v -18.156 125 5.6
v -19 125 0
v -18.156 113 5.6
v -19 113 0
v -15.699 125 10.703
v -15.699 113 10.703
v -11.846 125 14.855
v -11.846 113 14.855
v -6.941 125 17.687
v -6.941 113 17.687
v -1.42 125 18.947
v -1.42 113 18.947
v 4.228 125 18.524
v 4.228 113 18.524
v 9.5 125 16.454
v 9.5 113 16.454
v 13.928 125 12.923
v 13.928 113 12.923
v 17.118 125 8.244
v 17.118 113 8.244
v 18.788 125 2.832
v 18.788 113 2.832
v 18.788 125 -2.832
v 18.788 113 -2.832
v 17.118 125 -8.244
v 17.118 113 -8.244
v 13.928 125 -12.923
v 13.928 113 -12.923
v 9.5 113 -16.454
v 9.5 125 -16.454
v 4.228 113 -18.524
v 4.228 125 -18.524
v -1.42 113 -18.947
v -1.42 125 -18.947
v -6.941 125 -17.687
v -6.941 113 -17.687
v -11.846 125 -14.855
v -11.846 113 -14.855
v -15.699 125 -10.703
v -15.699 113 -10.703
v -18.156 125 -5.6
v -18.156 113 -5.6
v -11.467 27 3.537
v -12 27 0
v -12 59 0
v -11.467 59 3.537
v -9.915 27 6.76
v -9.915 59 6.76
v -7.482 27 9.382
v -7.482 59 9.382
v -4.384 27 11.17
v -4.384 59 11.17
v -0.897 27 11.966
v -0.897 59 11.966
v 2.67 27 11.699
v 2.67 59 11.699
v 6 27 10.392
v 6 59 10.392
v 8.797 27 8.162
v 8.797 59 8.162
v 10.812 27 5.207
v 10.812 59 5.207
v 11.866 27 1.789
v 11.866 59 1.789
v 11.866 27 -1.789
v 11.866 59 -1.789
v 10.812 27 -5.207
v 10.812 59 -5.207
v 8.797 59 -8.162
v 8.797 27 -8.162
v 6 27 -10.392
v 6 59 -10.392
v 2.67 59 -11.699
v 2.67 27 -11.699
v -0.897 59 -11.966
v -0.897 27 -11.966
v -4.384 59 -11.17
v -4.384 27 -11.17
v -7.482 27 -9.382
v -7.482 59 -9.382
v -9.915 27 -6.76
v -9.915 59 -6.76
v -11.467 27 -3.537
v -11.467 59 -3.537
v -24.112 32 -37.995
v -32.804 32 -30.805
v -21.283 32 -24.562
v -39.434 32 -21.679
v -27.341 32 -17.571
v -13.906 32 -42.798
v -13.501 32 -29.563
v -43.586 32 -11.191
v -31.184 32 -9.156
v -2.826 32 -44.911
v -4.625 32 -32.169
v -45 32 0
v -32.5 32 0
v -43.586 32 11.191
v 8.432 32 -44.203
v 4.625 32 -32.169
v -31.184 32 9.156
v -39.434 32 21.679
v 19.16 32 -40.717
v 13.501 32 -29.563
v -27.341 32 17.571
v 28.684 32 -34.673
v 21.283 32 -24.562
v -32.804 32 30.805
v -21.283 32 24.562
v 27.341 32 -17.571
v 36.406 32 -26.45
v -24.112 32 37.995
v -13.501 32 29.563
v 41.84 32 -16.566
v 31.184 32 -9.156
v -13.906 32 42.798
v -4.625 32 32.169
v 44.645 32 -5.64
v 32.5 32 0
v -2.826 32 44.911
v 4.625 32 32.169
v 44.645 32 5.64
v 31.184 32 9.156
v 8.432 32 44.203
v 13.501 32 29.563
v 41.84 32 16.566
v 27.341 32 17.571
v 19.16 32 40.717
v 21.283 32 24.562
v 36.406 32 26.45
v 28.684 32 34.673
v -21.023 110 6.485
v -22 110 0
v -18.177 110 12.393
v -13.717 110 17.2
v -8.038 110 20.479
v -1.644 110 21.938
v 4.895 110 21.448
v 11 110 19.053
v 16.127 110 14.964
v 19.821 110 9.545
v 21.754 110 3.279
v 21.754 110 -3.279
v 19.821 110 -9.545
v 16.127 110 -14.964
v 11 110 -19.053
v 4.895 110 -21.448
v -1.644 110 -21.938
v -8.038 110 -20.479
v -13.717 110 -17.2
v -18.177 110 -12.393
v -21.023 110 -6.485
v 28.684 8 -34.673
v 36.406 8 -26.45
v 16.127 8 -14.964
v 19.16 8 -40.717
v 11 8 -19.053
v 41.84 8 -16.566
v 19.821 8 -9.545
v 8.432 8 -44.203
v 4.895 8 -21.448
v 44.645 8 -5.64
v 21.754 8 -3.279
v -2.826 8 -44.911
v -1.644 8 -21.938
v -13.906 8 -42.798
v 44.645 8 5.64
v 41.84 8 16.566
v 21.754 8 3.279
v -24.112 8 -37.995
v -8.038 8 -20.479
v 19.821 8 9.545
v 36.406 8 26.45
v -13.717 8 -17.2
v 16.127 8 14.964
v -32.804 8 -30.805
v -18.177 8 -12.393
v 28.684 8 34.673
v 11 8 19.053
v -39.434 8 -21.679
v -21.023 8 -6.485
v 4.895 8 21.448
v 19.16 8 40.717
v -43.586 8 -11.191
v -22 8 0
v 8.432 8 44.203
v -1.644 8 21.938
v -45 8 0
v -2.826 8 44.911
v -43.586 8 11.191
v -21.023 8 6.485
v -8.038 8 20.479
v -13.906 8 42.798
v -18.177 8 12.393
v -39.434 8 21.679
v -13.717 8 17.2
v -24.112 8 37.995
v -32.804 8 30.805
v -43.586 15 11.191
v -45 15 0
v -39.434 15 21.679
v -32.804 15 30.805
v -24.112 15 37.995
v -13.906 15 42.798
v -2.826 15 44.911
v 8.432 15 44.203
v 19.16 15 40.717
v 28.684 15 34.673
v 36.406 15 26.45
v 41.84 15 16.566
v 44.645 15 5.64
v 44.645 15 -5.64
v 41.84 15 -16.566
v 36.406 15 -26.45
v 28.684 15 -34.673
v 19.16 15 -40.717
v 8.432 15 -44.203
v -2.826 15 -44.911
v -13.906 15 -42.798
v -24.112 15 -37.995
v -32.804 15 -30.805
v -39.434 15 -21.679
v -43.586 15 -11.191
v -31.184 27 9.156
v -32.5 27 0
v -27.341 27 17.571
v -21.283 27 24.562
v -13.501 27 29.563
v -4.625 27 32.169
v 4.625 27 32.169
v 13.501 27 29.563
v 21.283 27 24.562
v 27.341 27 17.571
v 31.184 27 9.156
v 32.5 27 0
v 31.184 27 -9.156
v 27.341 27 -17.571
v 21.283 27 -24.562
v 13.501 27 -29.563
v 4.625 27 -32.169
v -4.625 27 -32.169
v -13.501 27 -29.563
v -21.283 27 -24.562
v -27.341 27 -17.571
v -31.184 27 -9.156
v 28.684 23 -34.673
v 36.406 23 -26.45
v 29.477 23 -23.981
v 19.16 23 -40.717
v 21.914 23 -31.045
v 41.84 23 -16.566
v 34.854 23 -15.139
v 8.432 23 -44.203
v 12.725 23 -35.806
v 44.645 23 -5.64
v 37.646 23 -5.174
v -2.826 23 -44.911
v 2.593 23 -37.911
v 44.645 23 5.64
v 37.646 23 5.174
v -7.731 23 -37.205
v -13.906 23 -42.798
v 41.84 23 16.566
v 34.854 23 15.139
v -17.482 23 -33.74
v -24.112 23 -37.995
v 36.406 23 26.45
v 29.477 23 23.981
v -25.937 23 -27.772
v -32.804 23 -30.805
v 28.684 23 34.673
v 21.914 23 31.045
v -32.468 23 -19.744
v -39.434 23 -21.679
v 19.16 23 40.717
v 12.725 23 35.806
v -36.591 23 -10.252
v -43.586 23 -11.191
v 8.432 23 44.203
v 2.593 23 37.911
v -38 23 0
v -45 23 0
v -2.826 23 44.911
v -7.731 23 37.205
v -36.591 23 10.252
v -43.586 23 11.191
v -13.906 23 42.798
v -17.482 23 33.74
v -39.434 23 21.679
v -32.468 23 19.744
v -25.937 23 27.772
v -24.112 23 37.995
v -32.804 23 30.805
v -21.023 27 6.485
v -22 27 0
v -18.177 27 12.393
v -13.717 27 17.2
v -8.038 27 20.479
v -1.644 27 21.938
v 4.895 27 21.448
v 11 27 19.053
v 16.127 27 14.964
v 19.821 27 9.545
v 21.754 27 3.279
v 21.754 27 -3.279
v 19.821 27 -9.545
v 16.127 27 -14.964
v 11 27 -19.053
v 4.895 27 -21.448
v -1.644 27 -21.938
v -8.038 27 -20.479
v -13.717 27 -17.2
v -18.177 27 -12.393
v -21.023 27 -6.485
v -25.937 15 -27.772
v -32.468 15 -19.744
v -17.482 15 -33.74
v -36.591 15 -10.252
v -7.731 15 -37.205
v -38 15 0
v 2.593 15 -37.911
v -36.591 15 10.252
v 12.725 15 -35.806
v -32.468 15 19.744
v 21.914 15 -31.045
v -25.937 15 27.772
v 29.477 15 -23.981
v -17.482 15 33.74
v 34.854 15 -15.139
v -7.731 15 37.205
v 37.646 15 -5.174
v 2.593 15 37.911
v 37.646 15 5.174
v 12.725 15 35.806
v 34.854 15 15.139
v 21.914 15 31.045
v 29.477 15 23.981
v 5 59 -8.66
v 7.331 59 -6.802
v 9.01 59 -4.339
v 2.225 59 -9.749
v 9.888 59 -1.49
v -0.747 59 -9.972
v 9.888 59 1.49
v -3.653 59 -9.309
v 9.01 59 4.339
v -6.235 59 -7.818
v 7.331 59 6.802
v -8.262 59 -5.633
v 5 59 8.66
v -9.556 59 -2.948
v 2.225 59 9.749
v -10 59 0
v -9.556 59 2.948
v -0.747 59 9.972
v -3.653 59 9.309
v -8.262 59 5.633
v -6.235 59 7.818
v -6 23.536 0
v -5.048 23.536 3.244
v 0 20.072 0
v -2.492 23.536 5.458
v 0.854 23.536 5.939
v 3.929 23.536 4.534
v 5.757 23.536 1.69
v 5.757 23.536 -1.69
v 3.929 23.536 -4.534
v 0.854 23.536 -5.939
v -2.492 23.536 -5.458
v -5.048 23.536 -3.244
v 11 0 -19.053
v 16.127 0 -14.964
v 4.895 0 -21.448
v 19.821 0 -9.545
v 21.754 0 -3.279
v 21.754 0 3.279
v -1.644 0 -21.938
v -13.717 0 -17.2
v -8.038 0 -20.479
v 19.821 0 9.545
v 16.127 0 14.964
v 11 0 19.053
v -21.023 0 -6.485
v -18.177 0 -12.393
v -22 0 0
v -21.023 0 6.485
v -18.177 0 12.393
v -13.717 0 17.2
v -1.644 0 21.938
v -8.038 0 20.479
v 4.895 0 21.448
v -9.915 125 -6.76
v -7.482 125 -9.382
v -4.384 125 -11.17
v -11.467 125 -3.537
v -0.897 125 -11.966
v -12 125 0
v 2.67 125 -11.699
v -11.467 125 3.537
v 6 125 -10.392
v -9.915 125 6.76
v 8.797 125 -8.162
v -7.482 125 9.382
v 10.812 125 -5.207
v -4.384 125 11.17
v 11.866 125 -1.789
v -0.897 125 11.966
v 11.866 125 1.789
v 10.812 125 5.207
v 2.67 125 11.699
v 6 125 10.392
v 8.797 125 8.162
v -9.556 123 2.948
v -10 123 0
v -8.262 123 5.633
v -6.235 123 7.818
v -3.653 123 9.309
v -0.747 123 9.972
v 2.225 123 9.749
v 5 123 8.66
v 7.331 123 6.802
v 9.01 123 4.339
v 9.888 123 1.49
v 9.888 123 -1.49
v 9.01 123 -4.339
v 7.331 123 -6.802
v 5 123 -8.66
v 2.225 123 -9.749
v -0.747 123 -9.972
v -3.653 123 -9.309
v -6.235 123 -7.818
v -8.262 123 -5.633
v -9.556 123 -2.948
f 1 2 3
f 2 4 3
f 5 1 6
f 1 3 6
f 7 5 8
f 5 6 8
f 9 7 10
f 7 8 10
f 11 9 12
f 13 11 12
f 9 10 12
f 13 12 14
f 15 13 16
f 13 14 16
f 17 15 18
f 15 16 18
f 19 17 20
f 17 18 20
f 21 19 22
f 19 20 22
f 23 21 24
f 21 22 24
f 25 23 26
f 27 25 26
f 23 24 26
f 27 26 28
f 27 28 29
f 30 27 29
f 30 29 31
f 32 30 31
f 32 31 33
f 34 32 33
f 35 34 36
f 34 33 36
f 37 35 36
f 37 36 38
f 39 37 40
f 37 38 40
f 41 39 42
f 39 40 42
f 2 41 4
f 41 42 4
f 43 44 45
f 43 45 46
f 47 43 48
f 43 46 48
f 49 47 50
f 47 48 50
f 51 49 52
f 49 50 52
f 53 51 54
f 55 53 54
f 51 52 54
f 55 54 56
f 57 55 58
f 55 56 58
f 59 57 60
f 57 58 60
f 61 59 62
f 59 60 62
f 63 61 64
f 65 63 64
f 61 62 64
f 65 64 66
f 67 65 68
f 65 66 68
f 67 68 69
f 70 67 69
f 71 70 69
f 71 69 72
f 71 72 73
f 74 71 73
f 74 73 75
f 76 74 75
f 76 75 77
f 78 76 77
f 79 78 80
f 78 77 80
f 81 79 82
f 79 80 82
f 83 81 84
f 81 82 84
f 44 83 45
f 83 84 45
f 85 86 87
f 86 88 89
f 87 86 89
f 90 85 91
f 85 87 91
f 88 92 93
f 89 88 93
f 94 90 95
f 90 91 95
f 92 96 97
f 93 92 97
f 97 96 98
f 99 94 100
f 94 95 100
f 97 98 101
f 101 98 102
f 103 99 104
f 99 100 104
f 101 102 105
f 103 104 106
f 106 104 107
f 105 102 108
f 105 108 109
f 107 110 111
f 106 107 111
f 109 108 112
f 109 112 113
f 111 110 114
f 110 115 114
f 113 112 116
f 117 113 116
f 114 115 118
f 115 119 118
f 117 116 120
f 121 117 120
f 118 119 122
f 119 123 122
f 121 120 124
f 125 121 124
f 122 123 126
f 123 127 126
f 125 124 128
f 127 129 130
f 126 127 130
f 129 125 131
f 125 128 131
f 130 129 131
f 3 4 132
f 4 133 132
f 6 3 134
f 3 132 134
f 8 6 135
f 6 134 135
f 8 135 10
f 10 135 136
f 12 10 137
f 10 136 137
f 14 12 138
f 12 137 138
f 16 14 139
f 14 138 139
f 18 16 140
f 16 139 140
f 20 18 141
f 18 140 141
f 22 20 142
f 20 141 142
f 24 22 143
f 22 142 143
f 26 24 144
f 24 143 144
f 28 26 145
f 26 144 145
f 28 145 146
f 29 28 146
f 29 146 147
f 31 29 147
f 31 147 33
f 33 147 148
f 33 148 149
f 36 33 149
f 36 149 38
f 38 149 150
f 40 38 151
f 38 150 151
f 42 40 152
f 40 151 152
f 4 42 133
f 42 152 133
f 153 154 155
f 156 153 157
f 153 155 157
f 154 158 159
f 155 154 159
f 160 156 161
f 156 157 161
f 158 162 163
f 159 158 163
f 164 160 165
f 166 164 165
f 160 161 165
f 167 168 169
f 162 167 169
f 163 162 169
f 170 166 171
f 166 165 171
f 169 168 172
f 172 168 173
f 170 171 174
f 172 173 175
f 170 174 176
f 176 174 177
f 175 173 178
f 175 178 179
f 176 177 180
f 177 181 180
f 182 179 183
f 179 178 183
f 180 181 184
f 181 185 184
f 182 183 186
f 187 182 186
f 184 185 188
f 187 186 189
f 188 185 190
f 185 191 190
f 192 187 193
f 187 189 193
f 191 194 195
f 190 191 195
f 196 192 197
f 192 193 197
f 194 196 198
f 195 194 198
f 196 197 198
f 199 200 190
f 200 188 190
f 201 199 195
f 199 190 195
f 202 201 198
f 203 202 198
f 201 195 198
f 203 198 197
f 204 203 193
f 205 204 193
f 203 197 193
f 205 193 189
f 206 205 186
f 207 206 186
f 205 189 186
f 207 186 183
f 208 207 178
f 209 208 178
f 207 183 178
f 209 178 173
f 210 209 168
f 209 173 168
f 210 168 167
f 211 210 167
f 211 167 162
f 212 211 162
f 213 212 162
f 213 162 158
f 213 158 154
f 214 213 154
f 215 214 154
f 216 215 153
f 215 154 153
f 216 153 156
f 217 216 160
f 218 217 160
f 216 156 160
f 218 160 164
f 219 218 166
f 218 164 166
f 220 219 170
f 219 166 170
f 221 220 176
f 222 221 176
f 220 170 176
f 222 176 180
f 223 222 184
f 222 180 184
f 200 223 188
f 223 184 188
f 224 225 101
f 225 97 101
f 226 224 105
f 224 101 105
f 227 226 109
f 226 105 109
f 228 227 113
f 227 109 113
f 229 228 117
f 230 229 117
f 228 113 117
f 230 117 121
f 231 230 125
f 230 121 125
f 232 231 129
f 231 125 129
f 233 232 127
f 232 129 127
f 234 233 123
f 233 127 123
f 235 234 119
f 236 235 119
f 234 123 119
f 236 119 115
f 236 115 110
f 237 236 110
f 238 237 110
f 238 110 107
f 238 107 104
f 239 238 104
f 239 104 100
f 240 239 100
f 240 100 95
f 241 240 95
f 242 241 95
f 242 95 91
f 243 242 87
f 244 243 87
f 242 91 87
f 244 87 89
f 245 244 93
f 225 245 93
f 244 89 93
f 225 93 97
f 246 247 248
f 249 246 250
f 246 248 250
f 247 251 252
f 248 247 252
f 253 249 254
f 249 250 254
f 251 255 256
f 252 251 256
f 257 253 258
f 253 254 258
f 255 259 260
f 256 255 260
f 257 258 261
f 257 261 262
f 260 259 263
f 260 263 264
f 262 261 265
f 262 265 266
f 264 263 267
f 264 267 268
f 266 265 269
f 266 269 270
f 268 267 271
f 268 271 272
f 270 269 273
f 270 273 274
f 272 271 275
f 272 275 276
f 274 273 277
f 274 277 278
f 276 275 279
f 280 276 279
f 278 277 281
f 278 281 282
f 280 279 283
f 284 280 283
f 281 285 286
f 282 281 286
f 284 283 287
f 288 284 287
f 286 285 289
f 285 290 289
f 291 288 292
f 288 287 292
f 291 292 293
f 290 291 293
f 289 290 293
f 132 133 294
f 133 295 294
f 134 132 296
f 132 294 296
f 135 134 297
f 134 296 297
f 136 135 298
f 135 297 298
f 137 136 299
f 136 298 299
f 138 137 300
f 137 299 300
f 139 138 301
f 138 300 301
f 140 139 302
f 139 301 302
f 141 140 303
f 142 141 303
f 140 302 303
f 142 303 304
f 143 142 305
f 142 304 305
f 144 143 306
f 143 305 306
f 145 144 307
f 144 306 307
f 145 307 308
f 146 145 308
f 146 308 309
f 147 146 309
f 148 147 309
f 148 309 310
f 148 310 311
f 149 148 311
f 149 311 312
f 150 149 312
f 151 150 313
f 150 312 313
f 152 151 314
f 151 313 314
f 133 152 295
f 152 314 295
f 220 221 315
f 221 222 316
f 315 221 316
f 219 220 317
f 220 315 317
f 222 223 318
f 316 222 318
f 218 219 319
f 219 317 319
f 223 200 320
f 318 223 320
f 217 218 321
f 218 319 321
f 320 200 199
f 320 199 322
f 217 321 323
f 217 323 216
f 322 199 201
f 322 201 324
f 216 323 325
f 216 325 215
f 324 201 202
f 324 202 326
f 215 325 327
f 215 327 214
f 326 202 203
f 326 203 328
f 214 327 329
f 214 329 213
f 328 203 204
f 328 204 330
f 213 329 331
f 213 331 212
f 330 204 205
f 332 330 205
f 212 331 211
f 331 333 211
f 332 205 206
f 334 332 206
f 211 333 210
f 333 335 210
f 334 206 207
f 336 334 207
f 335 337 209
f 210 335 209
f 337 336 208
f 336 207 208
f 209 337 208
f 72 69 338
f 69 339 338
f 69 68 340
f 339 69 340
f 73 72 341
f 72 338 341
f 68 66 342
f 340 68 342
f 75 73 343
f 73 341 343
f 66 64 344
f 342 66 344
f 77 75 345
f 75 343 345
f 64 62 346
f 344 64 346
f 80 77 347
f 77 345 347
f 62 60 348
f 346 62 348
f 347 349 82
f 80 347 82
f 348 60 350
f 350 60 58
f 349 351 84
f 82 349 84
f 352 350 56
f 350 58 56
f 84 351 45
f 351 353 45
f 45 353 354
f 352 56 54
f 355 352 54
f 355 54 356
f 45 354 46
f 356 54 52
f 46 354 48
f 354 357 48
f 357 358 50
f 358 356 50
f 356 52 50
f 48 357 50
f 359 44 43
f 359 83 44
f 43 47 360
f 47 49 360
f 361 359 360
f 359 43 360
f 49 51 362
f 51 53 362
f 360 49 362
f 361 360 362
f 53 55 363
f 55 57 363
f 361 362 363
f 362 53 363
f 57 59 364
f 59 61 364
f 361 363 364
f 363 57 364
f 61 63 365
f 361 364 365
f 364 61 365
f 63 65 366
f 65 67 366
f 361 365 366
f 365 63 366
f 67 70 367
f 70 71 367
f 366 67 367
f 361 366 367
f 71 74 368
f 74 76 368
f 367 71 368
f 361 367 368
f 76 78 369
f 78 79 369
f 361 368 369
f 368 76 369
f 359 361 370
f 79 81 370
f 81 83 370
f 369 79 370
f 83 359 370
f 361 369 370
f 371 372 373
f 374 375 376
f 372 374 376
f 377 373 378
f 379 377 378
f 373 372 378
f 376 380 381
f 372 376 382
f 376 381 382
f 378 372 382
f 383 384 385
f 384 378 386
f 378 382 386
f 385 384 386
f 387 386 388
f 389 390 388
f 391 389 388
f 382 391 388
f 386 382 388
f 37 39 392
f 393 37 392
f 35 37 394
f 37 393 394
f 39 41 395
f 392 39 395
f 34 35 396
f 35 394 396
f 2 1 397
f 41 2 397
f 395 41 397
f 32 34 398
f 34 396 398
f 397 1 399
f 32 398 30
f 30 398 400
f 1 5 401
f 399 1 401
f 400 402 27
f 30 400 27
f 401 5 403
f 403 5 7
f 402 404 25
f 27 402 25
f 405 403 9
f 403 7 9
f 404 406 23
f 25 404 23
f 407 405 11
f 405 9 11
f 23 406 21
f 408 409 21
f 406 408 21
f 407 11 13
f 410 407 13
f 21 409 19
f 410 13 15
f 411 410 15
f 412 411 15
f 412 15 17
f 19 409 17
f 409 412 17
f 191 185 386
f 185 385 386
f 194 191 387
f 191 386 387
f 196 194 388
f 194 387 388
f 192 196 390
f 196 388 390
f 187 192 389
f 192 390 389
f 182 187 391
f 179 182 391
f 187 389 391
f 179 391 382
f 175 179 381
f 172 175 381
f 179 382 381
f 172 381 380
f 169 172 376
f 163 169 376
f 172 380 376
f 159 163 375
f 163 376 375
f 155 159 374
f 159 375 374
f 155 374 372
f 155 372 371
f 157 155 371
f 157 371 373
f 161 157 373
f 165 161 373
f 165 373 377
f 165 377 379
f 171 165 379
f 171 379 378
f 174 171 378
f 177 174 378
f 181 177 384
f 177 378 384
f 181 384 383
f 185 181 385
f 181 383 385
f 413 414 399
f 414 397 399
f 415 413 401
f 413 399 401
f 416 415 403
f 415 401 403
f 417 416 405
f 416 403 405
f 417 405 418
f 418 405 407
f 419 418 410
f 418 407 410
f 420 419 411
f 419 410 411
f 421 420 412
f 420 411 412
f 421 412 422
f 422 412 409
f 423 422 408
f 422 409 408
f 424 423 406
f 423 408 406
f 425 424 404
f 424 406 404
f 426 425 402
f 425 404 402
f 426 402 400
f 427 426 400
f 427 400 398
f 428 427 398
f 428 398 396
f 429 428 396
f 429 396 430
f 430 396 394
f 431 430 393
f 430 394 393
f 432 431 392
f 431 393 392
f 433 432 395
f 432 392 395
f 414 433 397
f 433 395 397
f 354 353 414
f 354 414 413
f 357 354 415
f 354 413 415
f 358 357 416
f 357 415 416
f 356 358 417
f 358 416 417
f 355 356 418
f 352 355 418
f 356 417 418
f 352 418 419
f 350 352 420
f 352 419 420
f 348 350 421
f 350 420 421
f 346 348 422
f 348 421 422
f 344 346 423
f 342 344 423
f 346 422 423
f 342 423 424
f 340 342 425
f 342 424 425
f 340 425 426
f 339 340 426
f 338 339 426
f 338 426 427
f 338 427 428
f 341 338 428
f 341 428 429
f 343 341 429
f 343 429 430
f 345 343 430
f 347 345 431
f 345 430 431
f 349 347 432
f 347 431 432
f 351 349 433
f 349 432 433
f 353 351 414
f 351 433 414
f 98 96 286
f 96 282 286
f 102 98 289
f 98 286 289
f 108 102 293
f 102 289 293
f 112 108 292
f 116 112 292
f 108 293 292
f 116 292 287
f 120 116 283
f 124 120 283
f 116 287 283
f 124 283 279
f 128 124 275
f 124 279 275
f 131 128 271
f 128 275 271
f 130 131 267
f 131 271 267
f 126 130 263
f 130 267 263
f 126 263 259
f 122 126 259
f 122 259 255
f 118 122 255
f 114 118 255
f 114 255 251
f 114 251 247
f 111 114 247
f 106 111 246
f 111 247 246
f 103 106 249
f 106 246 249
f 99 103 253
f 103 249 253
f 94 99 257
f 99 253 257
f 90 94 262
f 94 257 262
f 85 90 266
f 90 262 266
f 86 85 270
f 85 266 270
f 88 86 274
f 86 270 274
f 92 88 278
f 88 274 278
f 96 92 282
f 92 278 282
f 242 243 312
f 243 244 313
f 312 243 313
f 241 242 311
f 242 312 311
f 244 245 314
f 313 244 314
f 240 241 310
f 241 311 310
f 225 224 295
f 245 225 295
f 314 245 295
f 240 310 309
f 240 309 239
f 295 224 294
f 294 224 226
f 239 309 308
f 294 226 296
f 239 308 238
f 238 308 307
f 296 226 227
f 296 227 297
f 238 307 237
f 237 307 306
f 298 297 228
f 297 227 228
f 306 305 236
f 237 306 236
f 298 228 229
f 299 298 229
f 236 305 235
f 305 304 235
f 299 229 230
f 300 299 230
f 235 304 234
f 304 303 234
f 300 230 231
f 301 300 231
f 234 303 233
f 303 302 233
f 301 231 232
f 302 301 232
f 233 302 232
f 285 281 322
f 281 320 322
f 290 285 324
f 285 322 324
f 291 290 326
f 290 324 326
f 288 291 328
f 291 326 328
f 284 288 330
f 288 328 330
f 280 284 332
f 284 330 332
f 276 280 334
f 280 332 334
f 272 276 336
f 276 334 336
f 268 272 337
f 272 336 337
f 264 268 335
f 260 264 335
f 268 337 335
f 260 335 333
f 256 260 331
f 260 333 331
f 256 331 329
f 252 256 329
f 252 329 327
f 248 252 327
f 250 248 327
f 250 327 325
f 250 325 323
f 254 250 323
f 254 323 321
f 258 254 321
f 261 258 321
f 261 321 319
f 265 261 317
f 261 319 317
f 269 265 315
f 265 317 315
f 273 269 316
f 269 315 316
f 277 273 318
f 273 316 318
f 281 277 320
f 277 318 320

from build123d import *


with BuildPart() as part:
    # Эскиз1 → Повернуть1 (revolve)
    with BuildSketch(Plane(origin=(0, 0, 0), x_dir=(-1, 0, 0), z_dir=(0, 0, -1)), mode=Mode.PRIVATE) as revolve_1_sk:
        Polygon((-22, 0), (0, 0), (0, 20.07179677), (-12, 27), (-12, 59), (-10, 59), (-10, 123), (-12, 125), (-19, 125), (-19, 113), (-22, 110), (-22, 27), (-32.5, 27), (-32.5, 32), (-45, 32), (-45, 23), (-38, 23), (-38, 15), (-45, 15), (-45, 8), (-22, 8), align=None)
    revolve(revolve_1_sk.sketch.rotate(Axis((0, 0, 0), (0, 1, 0)), 180), axis=Axis((0, 0, 0), (0, 1, 0)))


solid = part.part
